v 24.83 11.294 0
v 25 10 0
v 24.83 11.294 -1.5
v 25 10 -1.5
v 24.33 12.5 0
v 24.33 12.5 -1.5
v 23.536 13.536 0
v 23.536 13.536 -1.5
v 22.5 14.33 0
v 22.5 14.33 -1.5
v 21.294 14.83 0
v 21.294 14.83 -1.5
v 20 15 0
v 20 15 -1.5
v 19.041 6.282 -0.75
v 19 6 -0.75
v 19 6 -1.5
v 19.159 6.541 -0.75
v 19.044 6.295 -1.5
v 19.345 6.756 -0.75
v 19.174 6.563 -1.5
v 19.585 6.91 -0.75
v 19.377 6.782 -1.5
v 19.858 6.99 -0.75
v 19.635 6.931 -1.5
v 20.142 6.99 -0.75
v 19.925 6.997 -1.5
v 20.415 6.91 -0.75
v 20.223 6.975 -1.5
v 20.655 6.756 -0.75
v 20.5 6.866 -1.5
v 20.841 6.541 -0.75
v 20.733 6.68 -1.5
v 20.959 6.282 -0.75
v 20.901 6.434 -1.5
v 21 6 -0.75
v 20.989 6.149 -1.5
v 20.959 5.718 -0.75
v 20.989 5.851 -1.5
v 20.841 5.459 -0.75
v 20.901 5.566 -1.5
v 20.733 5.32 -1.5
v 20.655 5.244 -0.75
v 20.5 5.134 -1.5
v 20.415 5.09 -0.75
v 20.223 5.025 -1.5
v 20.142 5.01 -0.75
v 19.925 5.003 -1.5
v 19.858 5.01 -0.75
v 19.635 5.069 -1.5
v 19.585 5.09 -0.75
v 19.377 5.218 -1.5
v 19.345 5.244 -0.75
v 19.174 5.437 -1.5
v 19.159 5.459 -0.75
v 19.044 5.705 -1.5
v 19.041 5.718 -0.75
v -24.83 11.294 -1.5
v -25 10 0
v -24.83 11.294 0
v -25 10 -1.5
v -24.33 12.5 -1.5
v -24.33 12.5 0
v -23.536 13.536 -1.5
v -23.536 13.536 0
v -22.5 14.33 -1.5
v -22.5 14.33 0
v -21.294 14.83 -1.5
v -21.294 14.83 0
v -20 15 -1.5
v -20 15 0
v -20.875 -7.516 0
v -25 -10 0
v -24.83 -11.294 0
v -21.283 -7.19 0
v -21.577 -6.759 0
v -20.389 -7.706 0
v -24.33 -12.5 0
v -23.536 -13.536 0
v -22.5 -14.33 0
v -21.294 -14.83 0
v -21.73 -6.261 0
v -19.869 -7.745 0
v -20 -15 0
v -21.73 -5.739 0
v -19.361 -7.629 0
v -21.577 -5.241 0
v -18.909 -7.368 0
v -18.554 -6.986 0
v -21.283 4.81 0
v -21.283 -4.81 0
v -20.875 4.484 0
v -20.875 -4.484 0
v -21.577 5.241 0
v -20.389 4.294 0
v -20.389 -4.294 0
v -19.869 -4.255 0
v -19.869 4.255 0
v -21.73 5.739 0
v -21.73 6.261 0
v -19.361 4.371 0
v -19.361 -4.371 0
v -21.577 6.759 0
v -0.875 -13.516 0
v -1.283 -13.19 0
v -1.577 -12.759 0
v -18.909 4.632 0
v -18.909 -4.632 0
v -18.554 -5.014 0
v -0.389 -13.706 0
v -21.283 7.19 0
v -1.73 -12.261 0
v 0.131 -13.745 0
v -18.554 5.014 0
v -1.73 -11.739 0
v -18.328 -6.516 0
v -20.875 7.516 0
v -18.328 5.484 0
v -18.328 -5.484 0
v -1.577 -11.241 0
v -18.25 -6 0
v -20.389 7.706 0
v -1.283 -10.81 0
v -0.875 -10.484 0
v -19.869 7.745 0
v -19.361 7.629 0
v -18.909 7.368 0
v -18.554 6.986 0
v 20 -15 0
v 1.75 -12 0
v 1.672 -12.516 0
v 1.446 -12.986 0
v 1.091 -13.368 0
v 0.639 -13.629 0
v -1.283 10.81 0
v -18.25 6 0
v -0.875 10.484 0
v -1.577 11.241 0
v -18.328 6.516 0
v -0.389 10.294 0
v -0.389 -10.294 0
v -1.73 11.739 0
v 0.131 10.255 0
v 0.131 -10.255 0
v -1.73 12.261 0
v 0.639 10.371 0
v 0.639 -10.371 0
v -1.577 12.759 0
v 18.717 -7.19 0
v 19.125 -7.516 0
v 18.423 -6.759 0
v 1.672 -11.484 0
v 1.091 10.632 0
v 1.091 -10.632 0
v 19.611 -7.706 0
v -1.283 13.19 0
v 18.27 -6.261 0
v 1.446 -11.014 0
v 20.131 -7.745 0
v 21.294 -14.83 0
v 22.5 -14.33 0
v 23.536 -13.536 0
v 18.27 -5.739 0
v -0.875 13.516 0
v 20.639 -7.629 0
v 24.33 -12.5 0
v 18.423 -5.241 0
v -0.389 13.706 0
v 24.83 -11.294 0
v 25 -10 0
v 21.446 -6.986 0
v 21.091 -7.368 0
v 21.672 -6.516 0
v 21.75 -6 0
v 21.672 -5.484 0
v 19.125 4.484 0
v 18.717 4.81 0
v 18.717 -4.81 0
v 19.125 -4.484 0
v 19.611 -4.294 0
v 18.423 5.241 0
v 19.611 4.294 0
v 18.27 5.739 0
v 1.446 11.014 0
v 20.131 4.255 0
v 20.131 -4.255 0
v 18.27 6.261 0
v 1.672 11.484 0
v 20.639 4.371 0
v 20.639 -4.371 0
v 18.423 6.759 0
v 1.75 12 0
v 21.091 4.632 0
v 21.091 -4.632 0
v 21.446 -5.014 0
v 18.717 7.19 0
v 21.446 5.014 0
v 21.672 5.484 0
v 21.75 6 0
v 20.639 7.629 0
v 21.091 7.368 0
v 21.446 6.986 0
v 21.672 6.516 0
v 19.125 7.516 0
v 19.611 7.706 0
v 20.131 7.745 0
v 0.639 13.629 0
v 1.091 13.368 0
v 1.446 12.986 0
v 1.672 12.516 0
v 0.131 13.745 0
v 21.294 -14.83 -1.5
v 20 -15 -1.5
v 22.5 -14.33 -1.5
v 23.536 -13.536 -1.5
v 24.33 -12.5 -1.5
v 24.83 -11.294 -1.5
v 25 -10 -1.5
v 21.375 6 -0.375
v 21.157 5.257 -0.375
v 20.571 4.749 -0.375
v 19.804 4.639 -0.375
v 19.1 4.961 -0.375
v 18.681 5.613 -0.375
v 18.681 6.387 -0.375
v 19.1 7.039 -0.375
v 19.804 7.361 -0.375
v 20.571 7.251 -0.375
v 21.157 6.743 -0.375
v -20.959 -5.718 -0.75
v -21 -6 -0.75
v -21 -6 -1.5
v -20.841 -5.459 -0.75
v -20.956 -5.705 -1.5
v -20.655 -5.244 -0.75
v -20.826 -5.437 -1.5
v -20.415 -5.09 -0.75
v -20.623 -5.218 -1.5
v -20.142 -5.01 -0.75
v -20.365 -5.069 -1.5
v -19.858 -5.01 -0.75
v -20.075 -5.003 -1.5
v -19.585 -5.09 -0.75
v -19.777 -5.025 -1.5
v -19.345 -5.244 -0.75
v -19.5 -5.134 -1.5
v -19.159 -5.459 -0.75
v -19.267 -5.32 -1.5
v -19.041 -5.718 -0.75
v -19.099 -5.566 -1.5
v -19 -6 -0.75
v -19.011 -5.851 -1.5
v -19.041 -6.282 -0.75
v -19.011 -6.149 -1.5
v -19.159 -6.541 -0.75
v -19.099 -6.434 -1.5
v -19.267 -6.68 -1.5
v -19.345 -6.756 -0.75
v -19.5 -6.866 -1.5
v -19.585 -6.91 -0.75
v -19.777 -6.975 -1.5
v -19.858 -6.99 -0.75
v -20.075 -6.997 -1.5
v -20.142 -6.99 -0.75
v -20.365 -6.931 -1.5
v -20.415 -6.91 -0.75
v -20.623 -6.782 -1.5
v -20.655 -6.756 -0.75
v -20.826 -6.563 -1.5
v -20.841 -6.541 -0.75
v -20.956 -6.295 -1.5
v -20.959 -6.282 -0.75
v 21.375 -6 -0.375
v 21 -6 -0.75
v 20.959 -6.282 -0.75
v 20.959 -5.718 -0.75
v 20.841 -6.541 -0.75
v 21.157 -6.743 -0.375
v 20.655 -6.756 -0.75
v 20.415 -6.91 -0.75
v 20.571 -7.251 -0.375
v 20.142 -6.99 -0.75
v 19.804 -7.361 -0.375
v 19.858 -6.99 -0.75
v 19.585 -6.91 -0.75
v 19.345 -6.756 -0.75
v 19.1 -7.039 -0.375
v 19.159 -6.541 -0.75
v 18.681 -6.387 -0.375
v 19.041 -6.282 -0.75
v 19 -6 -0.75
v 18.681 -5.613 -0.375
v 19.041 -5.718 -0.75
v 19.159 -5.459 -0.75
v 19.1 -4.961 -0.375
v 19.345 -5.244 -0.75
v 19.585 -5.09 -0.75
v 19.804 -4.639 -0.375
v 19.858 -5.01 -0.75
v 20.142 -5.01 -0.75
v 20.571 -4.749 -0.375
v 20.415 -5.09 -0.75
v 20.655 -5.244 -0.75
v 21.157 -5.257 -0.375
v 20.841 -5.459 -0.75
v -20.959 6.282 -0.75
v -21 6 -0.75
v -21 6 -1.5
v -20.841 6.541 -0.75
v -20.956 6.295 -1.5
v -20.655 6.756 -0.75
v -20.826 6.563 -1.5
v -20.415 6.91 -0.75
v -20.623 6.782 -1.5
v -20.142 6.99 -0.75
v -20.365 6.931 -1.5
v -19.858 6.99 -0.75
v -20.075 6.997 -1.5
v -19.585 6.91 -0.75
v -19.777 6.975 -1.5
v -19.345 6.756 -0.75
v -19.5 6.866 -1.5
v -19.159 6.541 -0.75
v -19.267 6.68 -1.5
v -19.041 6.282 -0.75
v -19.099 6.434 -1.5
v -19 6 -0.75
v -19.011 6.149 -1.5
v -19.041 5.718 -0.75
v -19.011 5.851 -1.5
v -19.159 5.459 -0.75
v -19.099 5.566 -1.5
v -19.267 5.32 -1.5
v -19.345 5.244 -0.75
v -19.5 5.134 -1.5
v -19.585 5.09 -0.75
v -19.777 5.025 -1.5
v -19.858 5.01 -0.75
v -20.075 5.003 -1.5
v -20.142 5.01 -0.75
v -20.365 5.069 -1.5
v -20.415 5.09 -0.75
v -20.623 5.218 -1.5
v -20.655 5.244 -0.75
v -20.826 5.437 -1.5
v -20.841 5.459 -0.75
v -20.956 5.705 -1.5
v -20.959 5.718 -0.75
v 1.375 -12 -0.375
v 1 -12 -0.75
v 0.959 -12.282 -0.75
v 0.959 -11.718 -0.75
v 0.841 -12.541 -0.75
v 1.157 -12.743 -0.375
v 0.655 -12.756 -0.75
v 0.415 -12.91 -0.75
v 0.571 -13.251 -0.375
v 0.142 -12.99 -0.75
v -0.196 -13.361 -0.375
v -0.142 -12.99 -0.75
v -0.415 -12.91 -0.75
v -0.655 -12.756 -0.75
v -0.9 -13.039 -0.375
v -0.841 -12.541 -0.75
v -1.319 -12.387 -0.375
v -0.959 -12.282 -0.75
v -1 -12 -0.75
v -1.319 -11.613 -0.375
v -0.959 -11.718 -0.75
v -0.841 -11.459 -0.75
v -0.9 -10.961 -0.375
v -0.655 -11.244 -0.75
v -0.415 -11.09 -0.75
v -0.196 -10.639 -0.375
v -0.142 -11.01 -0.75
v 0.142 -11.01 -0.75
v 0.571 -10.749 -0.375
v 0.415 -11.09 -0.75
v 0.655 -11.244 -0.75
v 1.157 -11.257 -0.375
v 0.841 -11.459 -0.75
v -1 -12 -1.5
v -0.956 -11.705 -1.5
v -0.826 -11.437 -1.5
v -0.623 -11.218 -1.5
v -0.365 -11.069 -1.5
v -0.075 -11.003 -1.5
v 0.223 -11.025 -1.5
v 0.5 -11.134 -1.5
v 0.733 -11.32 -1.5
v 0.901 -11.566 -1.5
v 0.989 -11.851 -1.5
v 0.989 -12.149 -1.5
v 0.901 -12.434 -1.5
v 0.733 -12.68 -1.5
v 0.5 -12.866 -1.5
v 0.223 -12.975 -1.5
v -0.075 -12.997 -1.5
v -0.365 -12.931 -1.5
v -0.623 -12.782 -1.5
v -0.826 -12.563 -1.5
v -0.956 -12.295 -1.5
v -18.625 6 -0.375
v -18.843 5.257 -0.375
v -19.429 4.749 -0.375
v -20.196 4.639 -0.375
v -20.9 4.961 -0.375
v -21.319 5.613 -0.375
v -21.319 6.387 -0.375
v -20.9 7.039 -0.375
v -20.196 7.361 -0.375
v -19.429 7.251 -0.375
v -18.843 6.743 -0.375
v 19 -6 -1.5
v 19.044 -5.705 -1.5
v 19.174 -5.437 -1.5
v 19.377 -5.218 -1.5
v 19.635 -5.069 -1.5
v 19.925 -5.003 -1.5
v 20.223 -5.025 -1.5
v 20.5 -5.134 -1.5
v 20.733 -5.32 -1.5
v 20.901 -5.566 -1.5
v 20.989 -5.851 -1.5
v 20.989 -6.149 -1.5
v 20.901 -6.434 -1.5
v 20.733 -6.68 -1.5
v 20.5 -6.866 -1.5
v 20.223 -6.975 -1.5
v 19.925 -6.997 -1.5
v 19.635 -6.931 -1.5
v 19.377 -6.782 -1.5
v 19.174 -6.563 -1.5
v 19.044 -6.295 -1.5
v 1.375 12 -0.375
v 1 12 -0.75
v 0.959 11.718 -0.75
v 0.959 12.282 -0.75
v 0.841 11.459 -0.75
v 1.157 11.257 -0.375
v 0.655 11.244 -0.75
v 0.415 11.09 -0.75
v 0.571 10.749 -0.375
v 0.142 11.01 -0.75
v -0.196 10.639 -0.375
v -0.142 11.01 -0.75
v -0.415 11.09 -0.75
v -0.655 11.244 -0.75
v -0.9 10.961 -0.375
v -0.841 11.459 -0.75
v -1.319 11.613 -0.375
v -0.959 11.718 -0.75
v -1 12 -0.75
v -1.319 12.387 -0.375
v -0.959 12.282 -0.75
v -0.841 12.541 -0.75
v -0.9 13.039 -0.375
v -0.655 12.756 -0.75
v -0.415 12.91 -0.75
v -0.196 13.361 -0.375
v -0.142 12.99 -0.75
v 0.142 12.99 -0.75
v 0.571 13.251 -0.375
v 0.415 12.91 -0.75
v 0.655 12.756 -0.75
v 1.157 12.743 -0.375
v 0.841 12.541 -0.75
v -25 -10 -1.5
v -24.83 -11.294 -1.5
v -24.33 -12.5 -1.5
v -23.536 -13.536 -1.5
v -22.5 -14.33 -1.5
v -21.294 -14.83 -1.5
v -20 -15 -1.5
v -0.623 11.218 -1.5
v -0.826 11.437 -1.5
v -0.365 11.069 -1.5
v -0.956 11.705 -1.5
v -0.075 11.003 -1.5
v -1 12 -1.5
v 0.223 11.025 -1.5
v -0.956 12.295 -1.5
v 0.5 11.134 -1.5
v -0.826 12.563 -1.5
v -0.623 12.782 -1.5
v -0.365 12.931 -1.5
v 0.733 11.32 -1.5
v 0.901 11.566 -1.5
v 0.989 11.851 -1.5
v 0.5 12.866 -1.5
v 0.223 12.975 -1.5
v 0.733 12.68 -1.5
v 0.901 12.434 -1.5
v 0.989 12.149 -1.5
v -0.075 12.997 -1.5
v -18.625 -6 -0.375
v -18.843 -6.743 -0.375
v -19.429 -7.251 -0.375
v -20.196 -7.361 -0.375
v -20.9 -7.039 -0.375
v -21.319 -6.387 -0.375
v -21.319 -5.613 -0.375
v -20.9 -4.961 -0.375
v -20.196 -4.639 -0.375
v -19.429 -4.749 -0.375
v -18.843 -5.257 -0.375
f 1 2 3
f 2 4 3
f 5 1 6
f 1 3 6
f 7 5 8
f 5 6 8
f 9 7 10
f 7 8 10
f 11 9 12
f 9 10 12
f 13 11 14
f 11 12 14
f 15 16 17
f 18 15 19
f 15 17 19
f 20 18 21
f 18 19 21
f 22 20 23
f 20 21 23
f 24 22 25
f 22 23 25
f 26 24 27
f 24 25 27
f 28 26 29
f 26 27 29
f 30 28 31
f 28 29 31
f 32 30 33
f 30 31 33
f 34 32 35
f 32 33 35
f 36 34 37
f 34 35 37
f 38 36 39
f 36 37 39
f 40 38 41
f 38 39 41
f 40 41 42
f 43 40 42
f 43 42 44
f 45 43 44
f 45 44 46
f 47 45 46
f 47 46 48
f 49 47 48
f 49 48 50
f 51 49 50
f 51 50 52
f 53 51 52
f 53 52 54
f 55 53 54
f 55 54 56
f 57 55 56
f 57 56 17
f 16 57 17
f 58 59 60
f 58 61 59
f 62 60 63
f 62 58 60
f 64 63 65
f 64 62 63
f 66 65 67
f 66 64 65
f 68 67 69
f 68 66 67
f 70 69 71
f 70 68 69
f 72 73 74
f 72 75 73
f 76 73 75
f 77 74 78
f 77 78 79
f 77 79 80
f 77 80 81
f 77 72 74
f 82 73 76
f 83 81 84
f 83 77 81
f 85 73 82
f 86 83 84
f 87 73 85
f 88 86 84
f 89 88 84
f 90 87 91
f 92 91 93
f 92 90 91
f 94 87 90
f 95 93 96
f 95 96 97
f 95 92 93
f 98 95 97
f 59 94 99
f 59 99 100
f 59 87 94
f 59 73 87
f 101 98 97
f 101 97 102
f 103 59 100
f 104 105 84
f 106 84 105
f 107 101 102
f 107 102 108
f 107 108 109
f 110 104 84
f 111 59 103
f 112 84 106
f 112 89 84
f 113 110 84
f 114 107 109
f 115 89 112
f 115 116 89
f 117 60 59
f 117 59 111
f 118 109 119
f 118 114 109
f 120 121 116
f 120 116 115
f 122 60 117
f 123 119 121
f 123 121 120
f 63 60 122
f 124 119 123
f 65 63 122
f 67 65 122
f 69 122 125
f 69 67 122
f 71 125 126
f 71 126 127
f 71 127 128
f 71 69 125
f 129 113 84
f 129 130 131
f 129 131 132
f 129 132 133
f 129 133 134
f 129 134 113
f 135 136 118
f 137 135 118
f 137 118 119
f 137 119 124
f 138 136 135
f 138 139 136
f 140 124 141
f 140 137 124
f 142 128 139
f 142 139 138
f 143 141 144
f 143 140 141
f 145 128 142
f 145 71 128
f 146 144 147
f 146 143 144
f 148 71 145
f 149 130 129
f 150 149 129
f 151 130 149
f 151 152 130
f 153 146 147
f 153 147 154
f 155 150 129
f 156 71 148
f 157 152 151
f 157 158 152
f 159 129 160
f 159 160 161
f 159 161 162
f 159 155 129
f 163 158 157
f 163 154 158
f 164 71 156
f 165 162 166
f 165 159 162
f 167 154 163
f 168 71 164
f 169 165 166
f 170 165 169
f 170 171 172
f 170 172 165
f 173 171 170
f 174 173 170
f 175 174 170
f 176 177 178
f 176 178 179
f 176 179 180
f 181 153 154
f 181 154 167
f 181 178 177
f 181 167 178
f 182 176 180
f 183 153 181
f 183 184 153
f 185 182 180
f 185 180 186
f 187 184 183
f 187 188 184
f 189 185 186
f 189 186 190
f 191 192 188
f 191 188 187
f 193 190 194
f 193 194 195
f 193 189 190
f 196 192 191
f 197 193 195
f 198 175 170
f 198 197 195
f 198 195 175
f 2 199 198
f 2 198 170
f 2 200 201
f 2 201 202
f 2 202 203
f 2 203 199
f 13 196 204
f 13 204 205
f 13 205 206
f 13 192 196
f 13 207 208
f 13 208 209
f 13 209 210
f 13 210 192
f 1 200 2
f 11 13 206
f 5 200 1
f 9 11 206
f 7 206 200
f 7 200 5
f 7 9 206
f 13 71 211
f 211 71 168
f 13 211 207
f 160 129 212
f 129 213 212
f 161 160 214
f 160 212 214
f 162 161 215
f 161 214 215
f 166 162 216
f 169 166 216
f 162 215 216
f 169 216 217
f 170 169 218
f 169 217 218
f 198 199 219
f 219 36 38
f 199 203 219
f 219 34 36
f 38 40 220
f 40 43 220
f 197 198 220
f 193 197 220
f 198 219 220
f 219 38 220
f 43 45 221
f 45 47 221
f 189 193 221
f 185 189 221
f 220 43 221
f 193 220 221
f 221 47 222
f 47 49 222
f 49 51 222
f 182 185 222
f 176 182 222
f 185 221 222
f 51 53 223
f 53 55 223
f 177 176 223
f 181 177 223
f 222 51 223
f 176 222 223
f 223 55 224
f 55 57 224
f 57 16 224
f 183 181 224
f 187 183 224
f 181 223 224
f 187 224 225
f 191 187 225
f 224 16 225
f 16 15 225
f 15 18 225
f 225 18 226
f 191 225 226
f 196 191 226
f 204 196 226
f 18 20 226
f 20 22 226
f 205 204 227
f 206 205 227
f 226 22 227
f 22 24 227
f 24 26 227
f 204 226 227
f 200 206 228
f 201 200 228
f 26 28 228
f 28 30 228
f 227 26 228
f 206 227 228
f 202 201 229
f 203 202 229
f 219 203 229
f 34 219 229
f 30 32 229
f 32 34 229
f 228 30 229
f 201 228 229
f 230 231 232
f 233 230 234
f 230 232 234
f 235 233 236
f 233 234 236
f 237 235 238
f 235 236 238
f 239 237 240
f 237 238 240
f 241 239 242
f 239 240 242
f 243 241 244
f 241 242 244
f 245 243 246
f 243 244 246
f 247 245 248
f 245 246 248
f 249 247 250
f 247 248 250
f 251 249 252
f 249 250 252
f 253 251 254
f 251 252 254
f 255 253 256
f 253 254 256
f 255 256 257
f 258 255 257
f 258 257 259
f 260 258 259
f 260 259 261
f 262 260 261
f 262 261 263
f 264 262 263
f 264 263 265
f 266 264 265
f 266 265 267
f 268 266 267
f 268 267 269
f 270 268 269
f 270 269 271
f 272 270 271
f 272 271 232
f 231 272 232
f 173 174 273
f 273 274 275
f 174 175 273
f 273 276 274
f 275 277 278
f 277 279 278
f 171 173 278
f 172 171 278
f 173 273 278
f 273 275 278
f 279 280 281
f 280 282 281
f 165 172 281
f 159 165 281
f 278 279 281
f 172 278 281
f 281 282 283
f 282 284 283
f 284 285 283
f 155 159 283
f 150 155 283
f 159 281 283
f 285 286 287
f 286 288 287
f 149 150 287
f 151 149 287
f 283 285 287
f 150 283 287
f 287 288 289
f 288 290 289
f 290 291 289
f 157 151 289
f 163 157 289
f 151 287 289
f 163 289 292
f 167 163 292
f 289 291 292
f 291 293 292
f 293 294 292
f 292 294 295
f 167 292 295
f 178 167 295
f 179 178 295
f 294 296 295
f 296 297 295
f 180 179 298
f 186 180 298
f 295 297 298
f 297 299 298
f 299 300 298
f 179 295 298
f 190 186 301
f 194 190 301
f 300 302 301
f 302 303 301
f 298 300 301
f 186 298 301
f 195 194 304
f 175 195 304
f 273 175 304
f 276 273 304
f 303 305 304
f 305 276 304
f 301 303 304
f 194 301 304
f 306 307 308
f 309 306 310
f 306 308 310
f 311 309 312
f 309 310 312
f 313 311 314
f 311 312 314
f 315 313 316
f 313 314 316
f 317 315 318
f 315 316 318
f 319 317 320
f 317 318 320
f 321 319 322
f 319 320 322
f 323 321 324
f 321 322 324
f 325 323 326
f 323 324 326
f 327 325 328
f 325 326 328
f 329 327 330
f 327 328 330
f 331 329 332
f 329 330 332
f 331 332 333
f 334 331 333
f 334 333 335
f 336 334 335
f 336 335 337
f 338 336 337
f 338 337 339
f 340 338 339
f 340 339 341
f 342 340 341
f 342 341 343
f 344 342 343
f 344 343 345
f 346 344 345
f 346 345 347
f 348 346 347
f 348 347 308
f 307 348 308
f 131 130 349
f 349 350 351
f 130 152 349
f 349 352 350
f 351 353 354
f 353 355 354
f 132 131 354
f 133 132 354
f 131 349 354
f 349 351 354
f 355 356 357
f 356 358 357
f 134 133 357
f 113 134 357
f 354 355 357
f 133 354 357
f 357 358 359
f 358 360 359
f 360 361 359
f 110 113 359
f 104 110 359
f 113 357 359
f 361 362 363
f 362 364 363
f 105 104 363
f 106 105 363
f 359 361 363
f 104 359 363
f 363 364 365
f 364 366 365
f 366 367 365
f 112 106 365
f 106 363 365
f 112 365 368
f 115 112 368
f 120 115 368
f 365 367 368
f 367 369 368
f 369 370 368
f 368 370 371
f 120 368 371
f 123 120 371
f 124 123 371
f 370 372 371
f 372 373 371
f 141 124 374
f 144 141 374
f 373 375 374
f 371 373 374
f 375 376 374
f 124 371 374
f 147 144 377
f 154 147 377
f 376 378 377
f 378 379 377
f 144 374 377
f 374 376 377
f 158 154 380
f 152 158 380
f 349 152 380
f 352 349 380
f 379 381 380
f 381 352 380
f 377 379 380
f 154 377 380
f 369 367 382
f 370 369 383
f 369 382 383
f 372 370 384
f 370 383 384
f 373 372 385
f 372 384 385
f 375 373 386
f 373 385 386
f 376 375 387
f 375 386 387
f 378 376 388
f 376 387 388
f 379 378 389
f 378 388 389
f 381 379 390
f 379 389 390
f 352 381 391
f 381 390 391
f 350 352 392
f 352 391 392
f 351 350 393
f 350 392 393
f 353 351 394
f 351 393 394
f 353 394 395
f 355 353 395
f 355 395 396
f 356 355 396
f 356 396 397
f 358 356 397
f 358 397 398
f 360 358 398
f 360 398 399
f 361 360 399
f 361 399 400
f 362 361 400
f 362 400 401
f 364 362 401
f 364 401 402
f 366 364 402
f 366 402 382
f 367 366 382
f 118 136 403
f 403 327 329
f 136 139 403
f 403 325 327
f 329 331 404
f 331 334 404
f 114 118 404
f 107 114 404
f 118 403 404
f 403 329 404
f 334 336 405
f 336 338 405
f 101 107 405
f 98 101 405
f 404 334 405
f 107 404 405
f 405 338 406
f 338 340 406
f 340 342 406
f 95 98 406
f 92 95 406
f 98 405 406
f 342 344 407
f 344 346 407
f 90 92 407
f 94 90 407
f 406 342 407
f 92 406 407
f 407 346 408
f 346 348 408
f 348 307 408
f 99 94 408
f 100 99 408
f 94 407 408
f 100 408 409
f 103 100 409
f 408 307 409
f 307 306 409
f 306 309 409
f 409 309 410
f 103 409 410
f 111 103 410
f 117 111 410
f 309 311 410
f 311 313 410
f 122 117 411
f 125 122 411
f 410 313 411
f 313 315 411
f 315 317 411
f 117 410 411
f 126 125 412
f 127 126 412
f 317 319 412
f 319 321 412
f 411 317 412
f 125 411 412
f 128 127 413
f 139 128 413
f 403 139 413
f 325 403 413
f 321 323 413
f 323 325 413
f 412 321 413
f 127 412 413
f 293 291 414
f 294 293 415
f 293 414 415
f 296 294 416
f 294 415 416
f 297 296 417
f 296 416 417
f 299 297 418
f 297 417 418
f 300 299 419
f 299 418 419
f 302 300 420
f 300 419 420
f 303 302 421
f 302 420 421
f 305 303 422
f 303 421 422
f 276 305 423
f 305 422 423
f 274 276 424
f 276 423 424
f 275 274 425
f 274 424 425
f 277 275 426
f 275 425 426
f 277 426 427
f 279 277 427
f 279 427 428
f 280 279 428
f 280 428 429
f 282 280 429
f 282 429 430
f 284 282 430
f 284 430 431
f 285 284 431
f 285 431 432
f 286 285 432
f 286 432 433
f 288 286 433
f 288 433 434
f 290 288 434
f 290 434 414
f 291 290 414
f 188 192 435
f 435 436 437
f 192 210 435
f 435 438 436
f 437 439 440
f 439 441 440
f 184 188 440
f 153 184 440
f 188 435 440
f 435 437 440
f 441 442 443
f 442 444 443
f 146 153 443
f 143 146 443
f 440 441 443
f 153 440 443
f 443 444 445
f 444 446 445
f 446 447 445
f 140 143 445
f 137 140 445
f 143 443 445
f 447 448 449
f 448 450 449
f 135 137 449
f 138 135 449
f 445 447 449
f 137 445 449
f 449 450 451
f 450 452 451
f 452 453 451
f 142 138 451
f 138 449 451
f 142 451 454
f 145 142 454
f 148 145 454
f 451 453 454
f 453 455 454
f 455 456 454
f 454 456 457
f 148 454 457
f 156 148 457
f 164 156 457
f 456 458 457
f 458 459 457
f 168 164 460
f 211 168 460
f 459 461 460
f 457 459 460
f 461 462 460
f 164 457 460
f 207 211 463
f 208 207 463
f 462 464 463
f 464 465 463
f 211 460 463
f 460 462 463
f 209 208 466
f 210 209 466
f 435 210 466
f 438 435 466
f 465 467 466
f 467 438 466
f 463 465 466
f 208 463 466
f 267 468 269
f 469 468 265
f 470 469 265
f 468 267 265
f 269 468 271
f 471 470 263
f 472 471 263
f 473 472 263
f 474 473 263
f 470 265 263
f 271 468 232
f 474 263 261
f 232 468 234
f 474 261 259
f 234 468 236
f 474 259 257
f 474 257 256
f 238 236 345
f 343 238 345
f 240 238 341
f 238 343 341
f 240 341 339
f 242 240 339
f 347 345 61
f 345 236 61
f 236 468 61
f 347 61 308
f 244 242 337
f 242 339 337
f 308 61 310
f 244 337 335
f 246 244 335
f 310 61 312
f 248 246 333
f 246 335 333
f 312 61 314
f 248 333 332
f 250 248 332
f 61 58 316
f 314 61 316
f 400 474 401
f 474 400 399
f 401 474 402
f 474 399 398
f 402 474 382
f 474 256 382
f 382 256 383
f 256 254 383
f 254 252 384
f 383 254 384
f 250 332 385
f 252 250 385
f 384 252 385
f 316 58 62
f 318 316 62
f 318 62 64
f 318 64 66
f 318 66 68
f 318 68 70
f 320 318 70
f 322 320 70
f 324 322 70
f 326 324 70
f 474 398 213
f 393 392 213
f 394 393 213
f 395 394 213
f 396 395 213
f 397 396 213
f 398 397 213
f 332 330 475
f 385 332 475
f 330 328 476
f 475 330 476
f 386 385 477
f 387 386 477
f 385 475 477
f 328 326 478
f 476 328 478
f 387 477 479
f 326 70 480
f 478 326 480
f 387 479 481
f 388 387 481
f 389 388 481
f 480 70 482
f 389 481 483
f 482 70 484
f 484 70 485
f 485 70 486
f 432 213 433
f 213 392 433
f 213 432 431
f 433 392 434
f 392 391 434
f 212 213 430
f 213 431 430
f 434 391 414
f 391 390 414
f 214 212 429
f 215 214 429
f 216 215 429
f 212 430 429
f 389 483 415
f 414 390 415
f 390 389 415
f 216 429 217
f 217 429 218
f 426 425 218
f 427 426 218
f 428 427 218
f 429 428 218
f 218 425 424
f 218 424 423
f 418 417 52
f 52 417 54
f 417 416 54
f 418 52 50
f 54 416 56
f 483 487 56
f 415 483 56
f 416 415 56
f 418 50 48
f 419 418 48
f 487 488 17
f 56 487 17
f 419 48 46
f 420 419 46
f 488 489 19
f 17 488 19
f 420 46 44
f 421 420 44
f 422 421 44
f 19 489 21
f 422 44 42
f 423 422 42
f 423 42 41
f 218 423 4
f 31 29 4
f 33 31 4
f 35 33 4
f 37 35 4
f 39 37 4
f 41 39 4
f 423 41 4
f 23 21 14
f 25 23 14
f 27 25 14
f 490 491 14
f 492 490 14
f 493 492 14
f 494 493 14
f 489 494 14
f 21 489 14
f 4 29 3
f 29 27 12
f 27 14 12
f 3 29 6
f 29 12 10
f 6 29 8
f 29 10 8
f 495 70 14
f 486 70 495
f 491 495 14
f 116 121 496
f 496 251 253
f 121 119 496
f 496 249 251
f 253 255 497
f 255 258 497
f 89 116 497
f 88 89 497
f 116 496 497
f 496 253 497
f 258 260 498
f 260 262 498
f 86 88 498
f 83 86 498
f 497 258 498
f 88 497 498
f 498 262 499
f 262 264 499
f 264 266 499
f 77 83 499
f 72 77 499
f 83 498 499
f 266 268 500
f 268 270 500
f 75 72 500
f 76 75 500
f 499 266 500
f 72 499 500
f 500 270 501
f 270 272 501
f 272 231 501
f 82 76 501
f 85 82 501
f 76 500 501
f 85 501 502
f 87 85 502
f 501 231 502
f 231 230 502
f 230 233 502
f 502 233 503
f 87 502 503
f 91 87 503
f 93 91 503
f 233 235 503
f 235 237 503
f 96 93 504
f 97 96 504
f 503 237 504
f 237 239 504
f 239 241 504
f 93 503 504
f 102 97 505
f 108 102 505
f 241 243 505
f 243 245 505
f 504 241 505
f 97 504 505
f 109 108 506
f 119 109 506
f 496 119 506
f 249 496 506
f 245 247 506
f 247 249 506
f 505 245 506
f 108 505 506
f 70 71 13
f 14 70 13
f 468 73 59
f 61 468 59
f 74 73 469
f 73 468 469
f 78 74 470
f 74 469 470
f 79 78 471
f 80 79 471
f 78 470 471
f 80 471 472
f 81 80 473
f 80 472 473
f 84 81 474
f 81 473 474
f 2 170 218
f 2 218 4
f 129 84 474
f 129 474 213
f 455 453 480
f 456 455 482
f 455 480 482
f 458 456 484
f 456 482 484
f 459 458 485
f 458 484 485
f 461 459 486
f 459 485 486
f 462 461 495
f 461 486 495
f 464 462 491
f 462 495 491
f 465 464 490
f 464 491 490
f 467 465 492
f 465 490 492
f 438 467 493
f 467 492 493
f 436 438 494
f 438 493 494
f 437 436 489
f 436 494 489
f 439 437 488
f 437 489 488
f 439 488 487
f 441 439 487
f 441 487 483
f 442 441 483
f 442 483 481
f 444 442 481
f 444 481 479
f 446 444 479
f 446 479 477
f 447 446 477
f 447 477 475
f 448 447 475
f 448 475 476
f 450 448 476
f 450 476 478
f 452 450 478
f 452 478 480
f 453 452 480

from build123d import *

# Parameters (mm, degrees)
SKIZZE1_W                                            = 50
SKIZZE1_H                                            = 30
BASIS_BLECH1_DEPTH                                   = 1.5
VERRUNDUNG1_R                                        = 5
FORMSENKUNG_F_R_M3_SENKSCHRAUBE_MIT_INNE_D           = 1.6
FORMSENKUNG_F_R_M3_SENKSCHRAUBE_MIT_INNE_DEPTH       = 8
FORMSENKUNG_F_R_M3_SENKSCHRAUBE_MIT_INNE_CSINK_D     = 3.5
FORMSENKUNG_F_R_M3_SENKSCHRAUBE_MIT_INNE_CSINK_ANGLE = 90
FORMSENKUNG_F_R_M3_SENKSCHRAUBE_MIT_INNE_TIP         = 0.480688495
SKIZZE8_R                                            = 1
SCHNITT_LINEAR_AUSTRAGEN1_DEPTH                      = 30.193321154


# Sheet-metal steps are written as plain solids
with BuildPart() as part:
    # Skizze1 → Basis-Blech1 (new body)
    with BuildSketch(Plane.XY):
        Rectangle(SKIZZE1_W, SKIZZE1_H)
    extrude(amount=-BASIS_BLECH1_DEPTH)

    # Verrundung1
    verrundung1_edges = [part.edges().sort_by_distance(p)[0] for p in [
        (-25, 15, -0.75),
        (25, 15, -0.75),
        (25, -15, -0.75),
        (-25, -15, -0.75),
    ]]
    fillet(verrundung1_edges, radius=VERRUNDUNG1_R)

    # Formsenkung für M3 Senkschraube mit Innensechskant2
    with Locations(Plane(origin=(-12.308549643, 4.902846213, 0), x_dir=(-1, 0, 0), z_dir=(0, 0, 1))):
        with Locations((-32.308549643, -1.097153787), (-12.308549643, -7.097153787), (7.691450357, -1.097153787), (7.691450357, 10.902846213), (-12.308549643, 16.902846213), (-32.308549643, 10.902846213)):
            CounterSinkHole(FORMSENKUNG_F_R_M3_SENKSCHRAUBE_MIT_INNE_D / 2, FORMSENKUNG_F_R_M3_SENKSCHRAUBE_MIT_INNE_CSINK_D / 2, depth=FORMSENKUNG_F_R_M3_SENKSCHRAUBE_MIT_INNE_DEPTH, counter_sink_angle=FORMSENKUNG_F_R_M3_SENKSCHRAUBE_MIT_INNE_CSINK_ANGLE)
            with Locations((0, 0, -(FORMSENKUNG_F_R_M3_SENKSCHRAUBE_MIT_INNE_DEPTH + FORMSENKUNG_F_R_M3_SENKSCHRAUBE_MIT_INNE_TIP / 2))):  # 118° drill point
                Cone(0, FORMSENKUNG_F_R_M3_SENKSCHRAUBE_MIT_INNE_D / 2, FORMSENKUNG_F_R_M3_SENKSCHRAUBE_MIT_INNE_TIP, mode=Mode.SUBTRACT)

    # Skizze8 → Schnitt-Linear austragen1 (cut, through all)
    with BuildSketch(Plane(origin=(0, 0, -1.5), x_dir=(-1, 0, 0), z_dir=(0, 0, -1))):
        with Locations((-20, 6)):
            Circle(SKIZZE8_R)
        with Locations((0, 12)):
            Circle(SKIZZE8_R)
        with Locations((20, 6)):
            Circle(SKIZZE8_R)
        with Locations((20, -6)):
            Circle(SKIZZE8_R)
        with Locations((0, -12)):
            Circle(SKIZZE8_R)
        with Locations((-20, -6)):
            Circle(SKIZZE8_R)
    extrude(amount=-SCHNITT_LINEAR_AUSTRAGEN1_DEPTH, mode=Mode.SUBTRACT)


solid = part.part
